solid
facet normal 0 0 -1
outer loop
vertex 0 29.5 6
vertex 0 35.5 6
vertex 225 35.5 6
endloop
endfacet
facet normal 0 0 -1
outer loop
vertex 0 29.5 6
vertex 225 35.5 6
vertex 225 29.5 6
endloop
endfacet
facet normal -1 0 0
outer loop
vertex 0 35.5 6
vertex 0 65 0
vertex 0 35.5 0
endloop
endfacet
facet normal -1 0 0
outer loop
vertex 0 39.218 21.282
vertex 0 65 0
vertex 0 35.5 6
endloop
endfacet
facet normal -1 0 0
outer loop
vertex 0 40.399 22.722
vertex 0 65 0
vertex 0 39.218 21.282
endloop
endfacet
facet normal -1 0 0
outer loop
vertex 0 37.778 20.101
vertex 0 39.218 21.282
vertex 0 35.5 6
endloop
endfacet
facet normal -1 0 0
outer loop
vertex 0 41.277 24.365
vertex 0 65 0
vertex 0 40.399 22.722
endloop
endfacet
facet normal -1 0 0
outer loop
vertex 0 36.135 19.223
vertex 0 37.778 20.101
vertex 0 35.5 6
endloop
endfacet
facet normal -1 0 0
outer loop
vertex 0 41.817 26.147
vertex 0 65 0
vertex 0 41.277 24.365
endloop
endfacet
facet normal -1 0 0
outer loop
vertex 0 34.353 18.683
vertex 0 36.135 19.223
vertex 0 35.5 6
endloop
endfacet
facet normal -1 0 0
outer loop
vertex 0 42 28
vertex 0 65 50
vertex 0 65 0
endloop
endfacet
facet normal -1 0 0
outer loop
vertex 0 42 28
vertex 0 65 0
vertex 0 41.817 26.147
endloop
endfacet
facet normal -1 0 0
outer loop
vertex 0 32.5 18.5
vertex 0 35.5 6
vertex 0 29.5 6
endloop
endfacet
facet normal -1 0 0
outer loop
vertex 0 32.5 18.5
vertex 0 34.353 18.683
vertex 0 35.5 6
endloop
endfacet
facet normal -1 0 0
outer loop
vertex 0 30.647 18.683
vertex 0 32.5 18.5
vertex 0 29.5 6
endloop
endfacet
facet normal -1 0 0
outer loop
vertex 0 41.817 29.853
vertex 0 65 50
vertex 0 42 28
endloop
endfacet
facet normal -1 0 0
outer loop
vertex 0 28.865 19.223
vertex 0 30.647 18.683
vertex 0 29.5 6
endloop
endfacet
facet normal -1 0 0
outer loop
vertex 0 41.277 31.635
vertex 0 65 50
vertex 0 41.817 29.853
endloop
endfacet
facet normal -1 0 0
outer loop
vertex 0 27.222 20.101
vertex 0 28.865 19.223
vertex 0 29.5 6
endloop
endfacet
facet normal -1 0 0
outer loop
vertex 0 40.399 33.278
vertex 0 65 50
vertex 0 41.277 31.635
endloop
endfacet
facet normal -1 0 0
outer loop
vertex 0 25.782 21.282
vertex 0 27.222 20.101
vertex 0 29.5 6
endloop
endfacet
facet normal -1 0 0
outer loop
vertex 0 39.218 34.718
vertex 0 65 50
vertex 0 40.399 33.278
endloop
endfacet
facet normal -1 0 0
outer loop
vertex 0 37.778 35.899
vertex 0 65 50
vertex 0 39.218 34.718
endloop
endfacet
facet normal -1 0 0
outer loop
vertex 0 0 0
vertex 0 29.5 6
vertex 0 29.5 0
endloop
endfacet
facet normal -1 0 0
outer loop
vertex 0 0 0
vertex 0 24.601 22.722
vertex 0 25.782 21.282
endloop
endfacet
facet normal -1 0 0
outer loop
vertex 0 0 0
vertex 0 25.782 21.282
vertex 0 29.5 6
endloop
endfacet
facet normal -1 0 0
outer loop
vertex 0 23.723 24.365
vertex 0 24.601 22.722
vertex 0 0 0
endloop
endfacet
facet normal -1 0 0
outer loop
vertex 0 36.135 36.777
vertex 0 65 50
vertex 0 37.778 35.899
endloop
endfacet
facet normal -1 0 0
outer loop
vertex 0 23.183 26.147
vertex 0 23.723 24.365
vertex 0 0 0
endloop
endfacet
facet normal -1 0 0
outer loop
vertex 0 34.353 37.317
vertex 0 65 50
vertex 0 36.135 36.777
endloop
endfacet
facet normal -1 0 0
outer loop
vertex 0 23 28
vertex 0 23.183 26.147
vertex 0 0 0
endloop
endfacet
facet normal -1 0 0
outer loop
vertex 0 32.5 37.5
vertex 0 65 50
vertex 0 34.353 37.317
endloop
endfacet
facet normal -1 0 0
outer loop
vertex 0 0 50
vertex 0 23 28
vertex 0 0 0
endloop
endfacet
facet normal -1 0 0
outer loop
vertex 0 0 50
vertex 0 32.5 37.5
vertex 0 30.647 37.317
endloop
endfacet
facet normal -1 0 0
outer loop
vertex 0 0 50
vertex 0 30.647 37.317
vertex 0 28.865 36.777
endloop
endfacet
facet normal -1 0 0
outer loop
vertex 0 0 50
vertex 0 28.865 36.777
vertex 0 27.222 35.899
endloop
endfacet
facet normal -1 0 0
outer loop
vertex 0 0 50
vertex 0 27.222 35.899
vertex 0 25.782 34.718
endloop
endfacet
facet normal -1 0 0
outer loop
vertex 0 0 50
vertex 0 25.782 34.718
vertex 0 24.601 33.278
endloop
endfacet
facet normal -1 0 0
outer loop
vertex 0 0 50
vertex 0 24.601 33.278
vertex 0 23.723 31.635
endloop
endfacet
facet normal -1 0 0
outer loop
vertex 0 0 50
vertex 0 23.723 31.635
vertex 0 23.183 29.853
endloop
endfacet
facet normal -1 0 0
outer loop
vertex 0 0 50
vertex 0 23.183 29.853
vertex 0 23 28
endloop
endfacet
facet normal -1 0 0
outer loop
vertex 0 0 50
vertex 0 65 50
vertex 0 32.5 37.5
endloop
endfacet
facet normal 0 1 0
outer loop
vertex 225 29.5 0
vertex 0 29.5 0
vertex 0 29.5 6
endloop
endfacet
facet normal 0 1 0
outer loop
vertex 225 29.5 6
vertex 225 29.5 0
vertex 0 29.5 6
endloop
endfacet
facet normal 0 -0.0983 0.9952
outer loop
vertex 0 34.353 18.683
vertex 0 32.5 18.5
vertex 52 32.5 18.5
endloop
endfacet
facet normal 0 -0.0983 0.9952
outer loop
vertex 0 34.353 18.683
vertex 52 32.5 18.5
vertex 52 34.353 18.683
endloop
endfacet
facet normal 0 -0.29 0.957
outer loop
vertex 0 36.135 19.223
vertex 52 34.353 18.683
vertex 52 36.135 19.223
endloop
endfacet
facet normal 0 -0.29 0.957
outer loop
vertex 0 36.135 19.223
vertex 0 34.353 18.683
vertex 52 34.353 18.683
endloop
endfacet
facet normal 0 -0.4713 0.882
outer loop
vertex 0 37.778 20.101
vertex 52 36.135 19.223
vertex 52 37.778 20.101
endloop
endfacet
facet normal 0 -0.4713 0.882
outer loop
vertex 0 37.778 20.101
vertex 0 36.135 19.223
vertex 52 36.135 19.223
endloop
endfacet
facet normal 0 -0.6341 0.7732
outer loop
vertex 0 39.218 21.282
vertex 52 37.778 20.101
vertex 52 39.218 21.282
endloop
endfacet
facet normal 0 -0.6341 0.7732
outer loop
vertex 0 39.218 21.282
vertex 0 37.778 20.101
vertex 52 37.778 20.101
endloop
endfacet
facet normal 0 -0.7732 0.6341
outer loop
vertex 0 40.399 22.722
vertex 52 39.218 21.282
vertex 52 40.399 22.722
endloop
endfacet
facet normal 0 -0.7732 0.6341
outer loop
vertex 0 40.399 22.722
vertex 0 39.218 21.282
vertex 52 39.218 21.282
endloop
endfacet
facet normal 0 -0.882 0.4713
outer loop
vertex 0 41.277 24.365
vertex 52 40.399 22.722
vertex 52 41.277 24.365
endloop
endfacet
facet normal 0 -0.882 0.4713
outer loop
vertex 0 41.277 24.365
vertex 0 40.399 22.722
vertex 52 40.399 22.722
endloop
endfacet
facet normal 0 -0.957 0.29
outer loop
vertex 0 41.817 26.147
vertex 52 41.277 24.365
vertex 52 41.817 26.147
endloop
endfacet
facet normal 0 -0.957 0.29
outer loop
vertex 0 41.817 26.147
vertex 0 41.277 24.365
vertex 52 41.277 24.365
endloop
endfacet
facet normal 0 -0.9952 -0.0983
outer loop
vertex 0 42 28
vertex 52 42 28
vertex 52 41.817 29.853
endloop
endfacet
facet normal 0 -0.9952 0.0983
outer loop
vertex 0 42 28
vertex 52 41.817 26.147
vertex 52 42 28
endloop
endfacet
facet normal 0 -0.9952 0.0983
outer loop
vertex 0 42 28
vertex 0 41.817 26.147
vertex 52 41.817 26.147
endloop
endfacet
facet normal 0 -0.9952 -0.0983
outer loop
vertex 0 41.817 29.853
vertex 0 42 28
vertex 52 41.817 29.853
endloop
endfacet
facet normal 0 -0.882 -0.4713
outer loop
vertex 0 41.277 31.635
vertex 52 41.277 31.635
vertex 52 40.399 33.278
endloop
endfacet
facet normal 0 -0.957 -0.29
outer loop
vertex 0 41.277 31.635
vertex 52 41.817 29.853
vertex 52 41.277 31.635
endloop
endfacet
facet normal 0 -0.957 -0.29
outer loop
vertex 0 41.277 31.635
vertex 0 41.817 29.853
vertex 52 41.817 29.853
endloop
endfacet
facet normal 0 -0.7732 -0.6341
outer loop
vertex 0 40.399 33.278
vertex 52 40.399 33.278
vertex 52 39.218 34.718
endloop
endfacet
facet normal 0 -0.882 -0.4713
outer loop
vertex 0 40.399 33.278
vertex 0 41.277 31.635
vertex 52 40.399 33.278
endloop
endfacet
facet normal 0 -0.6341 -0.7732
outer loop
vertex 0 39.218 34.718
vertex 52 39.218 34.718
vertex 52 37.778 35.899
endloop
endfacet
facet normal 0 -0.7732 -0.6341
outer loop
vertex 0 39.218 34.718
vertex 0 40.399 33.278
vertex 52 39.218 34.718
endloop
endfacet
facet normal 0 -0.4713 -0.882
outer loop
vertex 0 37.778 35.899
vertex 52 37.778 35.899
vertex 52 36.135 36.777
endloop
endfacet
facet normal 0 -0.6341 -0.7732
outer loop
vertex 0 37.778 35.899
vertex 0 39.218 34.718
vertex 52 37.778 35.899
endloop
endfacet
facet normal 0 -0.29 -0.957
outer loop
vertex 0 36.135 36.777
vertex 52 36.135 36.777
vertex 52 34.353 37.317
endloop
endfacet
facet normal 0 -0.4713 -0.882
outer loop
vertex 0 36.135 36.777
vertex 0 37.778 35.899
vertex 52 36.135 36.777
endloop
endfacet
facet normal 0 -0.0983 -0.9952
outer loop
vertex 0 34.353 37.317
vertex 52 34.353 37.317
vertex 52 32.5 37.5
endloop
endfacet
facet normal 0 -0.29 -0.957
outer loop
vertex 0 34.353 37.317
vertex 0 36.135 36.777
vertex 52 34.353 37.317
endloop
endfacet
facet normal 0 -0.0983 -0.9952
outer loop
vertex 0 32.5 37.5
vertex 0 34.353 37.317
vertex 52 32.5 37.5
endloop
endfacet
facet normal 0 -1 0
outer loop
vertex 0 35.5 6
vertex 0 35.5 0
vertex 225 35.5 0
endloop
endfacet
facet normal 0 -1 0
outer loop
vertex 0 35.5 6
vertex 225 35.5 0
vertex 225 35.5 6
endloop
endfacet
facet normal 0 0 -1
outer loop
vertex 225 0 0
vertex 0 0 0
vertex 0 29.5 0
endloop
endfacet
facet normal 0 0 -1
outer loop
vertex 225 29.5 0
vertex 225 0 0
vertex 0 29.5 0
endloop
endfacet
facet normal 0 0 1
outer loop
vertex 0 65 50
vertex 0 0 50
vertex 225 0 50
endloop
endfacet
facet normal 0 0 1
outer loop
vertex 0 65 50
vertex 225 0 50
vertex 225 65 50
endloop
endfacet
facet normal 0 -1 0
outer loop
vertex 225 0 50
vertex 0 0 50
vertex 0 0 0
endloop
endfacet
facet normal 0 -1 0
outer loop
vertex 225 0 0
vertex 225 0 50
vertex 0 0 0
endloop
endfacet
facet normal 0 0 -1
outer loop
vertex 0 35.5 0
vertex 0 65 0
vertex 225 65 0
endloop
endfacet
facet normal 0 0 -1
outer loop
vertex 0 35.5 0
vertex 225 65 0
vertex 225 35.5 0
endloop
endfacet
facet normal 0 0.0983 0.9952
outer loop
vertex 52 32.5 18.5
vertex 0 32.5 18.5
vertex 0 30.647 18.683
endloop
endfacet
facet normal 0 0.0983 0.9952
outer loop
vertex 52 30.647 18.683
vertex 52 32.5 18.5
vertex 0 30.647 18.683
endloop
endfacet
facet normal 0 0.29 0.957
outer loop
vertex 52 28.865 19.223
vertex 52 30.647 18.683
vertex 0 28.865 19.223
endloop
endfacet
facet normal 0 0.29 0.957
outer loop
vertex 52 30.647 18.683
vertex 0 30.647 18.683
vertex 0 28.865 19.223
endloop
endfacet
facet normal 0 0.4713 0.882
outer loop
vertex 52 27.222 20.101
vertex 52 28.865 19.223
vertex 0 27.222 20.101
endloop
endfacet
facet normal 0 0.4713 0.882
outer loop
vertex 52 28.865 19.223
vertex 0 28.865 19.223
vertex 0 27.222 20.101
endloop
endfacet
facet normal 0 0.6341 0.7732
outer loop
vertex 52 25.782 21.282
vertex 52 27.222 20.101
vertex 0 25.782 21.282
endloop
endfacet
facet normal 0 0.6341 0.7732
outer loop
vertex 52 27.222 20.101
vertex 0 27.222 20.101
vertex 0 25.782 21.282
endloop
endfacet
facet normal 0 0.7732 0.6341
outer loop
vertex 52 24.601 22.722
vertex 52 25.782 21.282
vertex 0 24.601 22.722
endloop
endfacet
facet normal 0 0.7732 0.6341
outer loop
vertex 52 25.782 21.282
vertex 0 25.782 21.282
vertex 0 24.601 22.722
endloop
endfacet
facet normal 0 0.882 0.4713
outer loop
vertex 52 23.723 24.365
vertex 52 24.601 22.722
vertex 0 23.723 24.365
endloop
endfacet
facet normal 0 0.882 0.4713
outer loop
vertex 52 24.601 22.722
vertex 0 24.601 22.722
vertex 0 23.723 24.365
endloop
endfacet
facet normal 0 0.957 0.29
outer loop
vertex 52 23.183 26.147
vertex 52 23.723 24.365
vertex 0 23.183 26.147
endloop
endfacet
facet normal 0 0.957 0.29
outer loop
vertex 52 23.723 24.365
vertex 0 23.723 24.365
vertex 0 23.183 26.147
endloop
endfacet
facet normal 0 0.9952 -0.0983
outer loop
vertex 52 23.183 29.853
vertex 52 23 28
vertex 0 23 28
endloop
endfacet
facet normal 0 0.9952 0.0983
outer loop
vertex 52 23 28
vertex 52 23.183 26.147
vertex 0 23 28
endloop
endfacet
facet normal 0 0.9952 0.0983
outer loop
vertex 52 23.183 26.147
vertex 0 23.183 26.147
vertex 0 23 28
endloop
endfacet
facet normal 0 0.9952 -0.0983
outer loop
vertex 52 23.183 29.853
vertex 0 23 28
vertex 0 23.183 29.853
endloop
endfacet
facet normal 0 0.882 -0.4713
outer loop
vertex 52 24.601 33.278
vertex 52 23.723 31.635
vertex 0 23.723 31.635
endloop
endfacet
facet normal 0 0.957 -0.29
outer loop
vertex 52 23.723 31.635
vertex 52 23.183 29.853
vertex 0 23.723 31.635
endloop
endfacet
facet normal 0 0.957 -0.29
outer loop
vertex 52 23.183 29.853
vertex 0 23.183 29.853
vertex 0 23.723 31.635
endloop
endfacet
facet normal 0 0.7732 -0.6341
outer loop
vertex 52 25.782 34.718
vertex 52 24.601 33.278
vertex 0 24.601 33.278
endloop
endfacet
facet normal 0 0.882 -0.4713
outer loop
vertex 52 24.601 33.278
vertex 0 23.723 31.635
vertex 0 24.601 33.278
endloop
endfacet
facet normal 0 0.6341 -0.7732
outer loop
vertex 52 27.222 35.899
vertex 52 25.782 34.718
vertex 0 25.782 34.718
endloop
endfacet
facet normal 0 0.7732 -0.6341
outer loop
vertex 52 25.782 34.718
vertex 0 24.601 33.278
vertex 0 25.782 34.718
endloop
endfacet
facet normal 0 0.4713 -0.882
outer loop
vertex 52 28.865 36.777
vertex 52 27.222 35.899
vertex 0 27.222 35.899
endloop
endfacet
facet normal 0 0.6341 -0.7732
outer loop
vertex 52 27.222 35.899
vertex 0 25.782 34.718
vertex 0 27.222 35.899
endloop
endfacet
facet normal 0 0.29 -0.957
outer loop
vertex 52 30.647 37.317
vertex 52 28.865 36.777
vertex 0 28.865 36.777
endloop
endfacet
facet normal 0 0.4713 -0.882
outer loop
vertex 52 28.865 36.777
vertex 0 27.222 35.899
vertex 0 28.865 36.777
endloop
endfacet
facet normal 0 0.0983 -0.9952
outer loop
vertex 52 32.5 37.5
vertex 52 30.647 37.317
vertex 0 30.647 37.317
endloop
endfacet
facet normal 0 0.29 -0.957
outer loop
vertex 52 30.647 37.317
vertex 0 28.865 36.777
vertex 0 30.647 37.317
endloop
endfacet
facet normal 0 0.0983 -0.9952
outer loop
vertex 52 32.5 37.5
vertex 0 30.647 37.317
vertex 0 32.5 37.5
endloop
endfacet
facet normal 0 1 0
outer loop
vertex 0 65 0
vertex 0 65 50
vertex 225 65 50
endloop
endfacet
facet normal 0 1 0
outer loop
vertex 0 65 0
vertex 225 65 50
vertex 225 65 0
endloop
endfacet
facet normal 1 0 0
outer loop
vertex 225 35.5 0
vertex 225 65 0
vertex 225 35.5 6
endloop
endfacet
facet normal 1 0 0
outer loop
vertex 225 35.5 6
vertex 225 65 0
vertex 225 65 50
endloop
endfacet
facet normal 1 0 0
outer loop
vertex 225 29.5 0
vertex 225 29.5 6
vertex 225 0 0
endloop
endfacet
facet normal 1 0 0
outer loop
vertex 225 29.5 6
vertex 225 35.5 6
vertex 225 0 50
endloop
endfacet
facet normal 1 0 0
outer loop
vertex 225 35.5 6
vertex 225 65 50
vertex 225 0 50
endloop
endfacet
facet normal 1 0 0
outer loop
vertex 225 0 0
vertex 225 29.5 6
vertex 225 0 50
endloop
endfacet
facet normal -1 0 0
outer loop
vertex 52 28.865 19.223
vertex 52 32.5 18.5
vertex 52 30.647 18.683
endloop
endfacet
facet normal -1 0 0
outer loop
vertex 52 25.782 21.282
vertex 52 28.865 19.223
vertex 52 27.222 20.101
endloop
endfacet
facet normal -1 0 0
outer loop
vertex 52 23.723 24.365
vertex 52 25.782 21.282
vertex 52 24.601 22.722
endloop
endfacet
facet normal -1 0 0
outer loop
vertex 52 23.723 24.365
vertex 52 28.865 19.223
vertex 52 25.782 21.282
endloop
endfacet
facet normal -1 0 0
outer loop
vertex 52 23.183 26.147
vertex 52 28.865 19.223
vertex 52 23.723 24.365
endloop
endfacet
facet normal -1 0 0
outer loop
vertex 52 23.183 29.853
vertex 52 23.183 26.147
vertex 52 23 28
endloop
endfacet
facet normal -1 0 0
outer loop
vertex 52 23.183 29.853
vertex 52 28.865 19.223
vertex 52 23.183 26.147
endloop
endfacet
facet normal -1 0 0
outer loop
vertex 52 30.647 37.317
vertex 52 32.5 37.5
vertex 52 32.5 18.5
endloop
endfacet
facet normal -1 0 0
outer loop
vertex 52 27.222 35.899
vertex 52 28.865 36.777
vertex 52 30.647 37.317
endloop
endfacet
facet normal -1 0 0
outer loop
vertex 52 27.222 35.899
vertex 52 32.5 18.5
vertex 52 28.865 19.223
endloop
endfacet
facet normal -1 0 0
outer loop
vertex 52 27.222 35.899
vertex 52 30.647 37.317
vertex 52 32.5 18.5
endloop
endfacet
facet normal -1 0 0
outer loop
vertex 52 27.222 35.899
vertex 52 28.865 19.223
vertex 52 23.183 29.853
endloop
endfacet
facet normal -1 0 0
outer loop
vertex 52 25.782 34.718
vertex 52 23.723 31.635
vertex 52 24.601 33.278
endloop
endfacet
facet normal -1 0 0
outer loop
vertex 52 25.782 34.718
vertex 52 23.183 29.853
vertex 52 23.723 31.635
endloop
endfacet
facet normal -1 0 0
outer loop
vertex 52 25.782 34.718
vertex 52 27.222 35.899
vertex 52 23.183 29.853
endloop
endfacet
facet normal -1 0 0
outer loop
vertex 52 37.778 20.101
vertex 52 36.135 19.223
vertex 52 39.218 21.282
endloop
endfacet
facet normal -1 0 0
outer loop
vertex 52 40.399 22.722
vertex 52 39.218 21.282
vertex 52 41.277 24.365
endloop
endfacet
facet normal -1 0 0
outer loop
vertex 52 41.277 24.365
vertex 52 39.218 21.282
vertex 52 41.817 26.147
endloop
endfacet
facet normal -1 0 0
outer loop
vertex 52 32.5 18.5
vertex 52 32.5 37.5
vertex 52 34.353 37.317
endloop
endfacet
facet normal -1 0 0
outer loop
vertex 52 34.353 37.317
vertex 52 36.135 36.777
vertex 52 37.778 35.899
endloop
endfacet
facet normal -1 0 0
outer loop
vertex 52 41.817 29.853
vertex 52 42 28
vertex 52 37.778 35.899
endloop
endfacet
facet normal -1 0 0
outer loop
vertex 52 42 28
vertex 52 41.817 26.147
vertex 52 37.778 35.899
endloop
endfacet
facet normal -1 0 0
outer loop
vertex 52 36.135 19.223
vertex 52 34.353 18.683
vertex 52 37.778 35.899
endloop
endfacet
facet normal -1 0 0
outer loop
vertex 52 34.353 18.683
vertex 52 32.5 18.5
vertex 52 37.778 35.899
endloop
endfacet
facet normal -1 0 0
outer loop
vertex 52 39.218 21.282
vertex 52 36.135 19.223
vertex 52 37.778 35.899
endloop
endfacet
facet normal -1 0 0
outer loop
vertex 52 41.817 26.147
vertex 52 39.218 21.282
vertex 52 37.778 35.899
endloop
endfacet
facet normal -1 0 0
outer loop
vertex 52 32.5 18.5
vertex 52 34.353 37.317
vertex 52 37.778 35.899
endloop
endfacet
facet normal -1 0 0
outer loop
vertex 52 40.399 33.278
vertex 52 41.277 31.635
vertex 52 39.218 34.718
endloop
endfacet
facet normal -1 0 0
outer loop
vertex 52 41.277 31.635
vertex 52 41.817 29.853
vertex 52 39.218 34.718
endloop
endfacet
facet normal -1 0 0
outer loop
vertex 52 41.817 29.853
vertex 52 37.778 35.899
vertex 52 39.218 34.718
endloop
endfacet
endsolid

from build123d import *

# Parameters (mm, degrees)
F1_DEPTH = 225
F2_R     = 9.5
F3_DEPTH = 52


with BuildPart() as f1:
    # F0 (on Right) → F1 (new body)
    with BuildSketch(Plane.YZ):
        Polygon((0, 50), (0, 0), (29.5, 0), (29.5, 6), (32.5, 6), (32.5, 50), align=None)
    extrude(amount=F1_DEPTH)

    # F2 (on face) → F3 (cut)
    with BuildSketch(Plane(origin=(0, 0, 0), x_dir=(0, -1, 0), z_dir=(-1, 0, 0))):
        with Locations((-32.5, 28)):
            Circle(F2_R)
    extrude(amount=-F3_DEPTH, mode=Mode.SUBTRACT)

    # F4: F1 across face


with BuildPart() as f1_1:
    add(f1.part)
    add(f1.part.mirror(Plane(origin=(122.089542, 32.5, 28), x_dir=(-1, 0, 0), z_dir=(0, 1, 0))))


solid = f1_1.part
